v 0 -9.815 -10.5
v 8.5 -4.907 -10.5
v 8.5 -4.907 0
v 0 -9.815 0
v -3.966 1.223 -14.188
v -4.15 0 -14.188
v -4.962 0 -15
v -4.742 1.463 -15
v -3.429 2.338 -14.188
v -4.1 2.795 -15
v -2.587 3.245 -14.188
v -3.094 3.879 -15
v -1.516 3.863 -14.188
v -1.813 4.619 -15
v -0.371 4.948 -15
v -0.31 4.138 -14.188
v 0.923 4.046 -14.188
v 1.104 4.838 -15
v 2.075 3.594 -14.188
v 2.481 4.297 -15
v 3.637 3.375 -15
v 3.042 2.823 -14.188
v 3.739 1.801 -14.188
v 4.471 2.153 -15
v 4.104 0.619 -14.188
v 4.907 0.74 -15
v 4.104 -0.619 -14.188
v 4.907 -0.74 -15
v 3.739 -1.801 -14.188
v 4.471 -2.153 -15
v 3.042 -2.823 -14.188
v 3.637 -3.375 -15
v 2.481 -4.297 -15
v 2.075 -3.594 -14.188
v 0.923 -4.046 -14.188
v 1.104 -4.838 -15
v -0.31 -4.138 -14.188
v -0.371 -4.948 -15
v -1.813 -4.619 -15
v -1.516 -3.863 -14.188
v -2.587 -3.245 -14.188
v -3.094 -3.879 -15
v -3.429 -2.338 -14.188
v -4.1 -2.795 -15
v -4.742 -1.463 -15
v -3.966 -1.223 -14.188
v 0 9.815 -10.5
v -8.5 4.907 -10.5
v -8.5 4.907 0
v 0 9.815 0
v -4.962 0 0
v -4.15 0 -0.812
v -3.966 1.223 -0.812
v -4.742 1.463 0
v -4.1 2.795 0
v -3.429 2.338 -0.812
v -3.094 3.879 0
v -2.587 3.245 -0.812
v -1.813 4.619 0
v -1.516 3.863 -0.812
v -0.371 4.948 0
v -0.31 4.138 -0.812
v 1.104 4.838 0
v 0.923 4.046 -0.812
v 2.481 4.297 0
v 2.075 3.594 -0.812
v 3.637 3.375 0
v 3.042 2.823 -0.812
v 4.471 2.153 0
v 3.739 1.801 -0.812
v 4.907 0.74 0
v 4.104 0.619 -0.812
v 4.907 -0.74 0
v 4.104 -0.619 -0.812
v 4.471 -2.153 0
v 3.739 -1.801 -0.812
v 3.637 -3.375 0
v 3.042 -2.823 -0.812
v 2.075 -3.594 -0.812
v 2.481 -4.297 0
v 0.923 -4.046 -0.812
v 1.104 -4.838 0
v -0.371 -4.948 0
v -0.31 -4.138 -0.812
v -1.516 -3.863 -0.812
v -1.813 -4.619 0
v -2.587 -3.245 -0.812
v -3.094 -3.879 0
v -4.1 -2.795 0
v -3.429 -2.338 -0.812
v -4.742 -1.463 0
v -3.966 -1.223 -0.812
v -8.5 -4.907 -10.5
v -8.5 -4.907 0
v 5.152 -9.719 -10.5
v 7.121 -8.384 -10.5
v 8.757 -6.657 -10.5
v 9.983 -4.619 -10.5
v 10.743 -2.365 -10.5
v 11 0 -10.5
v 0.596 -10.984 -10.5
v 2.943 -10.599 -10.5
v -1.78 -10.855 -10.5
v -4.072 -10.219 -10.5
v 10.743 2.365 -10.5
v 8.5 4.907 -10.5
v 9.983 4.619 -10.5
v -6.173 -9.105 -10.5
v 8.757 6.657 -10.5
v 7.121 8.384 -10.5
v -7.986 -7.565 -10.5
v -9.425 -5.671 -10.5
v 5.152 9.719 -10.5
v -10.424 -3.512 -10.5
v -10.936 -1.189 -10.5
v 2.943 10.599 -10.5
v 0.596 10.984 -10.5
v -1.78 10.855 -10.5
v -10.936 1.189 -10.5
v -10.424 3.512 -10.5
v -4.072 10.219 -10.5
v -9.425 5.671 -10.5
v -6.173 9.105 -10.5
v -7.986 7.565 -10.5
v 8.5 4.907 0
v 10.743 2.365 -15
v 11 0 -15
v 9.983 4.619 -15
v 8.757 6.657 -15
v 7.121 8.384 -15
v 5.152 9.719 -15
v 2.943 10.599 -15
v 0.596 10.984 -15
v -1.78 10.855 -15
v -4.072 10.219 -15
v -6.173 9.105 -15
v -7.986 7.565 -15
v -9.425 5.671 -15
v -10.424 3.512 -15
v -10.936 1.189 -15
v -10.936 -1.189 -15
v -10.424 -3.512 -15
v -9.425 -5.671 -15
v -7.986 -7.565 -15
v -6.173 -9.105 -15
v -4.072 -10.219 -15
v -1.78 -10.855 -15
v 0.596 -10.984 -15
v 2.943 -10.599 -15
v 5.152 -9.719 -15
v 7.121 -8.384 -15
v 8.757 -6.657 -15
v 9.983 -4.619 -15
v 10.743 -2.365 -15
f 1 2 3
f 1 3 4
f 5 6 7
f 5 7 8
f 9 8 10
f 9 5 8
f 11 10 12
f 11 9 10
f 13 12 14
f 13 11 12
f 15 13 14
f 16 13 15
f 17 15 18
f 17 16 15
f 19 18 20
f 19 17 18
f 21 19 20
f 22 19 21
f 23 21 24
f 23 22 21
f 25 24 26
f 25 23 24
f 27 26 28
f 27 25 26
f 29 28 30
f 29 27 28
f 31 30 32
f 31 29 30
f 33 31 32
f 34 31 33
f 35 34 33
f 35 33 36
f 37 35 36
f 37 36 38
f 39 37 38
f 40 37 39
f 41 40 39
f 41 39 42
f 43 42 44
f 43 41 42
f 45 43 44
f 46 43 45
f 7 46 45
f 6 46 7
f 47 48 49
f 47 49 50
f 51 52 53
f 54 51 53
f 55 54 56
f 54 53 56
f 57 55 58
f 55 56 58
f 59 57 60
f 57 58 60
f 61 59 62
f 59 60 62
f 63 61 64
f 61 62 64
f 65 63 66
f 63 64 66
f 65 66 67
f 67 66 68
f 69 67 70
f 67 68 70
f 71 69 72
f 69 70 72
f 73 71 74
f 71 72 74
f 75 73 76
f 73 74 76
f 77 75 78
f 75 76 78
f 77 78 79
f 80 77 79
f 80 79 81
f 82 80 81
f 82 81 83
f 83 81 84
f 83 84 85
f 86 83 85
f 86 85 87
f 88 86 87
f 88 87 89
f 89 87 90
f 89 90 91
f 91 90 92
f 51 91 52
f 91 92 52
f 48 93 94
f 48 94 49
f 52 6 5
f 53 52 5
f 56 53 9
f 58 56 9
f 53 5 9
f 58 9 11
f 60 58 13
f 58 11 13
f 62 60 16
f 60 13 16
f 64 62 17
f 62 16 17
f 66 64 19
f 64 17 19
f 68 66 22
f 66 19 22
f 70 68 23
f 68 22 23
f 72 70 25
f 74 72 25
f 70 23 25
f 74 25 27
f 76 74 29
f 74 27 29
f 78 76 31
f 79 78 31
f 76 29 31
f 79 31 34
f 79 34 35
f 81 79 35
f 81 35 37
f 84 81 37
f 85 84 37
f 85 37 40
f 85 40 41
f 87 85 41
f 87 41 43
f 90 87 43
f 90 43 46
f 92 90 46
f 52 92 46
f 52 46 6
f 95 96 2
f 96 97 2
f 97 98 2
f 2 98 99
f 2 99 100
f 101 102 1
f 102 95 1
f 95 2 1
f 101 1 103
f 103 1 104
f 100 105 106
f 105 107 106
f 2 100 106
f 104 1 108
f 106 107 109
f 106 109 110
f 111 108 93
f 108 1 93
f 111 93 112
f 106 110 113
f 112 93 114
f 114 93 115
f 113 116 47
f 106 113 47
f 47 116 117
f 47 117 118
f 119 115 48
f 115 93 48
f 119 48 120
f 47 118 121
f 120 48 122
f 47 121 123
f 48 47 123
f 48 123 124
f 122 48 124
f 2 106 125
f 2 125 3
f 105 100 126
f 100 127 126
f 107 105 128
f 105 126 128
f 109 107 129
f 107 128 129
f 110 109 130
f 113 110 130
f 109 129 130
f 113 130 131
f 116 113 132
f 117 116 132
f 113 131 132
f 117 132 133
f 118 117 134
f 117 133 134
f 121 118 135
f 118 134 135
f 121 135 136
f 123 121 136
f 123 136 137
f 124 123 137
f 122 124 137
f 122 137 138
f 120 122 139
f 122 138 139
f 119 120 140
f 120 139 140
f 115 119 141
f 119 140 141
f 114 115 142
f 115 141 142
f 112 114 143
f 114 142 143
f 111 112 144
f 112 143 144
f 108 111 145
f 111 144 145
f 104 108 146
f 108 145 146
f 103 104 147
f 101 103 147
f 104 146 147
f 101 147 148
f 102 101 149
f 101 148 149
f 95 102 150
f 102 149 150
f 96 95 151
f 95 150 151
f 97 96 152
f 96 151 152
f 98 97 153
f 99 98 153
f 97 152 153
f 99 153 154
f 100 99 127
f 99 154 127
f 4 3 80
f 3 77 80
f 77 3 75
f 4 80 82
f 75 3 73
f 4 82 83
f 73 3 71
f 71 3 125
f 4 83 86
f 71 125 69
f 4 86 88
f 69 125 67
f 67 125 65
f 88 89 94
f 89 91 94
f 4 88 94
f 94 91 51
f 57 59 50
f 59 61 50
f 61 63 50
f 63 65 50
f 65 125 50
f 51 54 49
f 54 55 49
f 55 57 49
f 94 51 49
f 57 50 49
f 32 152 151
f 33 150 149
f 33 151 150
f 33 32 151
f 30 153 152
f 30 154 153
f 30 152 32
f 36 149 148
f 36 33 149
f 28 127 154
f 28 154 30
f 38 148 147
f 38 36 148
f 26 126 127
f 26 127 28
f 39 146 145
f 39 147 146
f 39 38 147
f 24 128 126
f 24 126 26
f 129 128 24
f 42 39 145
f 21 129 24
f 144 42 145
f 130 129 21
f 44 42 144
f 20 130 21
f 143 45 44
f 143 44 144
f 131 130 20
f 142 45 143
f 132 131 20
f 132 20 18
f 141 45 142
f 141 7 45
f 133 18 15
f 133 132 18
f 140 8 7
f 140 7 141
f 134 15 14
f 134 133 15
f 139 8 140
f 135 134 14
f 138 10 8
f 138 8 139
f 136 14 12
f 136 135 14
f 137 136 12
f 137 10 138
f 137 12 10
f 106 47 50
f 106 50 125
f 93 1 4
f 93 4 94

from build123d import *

# Parameters (mm, degrees)
SKETCH_1_W          = 11
SKETCH_1_H          = 4.5
EXTRUDE_1_DEPTH     = 10.5
HOLE_WIZARD_1_D     = 8.3
HOLE_WIZARD_1_DEPTH = 15
CHAMFER_1_SIZE      = 0.812


with BuildPart() as part:
    # 草圖1 → 旋轉1 (revolve)
    with BuildSketch(Plane(origin=(0, 0, 0), x_dir=(1, 0, 0), z_dir=(0, 1, 0))):
        with Locations((5.5, 12.75)):
            Rectangle(SKETCH_1_W, SKETCH_1_H)
    revolve(axis=Axis((0, 0, -15), (0, 0, 1)))

    # 草圖2 → 填料-伸長1 (add)
    with BuildSketch(Plane.XY.offset(-10.5)):
        Polygon((-8.5, -4.907477288), (-8.5, 4.907477288), (0, 9.814954576), (8.5, 4.907477288), (8.5, -4.907477288), (0, -9.814954576), align=None)
    extrude(amount=EXTRUDE_1_DEPTH)

    # 鑽孔1
    with Locations(Plane.XY):
        with Locations((0, 0)):
            Hole(HOLE_WIZARD_1_D / 2, depth=HOLE_WIZARD_1_DEPTH)

    # 導角1
    chamfer_1_edges = [part.edges().sort_by_distance(p)[0] for p in [
        (4.15, 0, 0),
        (4.15, 0, -15),
    ]]
    chamfer(chamfer_1_edges, length=CHAMFER_1_SIZE)


solid = part.part
